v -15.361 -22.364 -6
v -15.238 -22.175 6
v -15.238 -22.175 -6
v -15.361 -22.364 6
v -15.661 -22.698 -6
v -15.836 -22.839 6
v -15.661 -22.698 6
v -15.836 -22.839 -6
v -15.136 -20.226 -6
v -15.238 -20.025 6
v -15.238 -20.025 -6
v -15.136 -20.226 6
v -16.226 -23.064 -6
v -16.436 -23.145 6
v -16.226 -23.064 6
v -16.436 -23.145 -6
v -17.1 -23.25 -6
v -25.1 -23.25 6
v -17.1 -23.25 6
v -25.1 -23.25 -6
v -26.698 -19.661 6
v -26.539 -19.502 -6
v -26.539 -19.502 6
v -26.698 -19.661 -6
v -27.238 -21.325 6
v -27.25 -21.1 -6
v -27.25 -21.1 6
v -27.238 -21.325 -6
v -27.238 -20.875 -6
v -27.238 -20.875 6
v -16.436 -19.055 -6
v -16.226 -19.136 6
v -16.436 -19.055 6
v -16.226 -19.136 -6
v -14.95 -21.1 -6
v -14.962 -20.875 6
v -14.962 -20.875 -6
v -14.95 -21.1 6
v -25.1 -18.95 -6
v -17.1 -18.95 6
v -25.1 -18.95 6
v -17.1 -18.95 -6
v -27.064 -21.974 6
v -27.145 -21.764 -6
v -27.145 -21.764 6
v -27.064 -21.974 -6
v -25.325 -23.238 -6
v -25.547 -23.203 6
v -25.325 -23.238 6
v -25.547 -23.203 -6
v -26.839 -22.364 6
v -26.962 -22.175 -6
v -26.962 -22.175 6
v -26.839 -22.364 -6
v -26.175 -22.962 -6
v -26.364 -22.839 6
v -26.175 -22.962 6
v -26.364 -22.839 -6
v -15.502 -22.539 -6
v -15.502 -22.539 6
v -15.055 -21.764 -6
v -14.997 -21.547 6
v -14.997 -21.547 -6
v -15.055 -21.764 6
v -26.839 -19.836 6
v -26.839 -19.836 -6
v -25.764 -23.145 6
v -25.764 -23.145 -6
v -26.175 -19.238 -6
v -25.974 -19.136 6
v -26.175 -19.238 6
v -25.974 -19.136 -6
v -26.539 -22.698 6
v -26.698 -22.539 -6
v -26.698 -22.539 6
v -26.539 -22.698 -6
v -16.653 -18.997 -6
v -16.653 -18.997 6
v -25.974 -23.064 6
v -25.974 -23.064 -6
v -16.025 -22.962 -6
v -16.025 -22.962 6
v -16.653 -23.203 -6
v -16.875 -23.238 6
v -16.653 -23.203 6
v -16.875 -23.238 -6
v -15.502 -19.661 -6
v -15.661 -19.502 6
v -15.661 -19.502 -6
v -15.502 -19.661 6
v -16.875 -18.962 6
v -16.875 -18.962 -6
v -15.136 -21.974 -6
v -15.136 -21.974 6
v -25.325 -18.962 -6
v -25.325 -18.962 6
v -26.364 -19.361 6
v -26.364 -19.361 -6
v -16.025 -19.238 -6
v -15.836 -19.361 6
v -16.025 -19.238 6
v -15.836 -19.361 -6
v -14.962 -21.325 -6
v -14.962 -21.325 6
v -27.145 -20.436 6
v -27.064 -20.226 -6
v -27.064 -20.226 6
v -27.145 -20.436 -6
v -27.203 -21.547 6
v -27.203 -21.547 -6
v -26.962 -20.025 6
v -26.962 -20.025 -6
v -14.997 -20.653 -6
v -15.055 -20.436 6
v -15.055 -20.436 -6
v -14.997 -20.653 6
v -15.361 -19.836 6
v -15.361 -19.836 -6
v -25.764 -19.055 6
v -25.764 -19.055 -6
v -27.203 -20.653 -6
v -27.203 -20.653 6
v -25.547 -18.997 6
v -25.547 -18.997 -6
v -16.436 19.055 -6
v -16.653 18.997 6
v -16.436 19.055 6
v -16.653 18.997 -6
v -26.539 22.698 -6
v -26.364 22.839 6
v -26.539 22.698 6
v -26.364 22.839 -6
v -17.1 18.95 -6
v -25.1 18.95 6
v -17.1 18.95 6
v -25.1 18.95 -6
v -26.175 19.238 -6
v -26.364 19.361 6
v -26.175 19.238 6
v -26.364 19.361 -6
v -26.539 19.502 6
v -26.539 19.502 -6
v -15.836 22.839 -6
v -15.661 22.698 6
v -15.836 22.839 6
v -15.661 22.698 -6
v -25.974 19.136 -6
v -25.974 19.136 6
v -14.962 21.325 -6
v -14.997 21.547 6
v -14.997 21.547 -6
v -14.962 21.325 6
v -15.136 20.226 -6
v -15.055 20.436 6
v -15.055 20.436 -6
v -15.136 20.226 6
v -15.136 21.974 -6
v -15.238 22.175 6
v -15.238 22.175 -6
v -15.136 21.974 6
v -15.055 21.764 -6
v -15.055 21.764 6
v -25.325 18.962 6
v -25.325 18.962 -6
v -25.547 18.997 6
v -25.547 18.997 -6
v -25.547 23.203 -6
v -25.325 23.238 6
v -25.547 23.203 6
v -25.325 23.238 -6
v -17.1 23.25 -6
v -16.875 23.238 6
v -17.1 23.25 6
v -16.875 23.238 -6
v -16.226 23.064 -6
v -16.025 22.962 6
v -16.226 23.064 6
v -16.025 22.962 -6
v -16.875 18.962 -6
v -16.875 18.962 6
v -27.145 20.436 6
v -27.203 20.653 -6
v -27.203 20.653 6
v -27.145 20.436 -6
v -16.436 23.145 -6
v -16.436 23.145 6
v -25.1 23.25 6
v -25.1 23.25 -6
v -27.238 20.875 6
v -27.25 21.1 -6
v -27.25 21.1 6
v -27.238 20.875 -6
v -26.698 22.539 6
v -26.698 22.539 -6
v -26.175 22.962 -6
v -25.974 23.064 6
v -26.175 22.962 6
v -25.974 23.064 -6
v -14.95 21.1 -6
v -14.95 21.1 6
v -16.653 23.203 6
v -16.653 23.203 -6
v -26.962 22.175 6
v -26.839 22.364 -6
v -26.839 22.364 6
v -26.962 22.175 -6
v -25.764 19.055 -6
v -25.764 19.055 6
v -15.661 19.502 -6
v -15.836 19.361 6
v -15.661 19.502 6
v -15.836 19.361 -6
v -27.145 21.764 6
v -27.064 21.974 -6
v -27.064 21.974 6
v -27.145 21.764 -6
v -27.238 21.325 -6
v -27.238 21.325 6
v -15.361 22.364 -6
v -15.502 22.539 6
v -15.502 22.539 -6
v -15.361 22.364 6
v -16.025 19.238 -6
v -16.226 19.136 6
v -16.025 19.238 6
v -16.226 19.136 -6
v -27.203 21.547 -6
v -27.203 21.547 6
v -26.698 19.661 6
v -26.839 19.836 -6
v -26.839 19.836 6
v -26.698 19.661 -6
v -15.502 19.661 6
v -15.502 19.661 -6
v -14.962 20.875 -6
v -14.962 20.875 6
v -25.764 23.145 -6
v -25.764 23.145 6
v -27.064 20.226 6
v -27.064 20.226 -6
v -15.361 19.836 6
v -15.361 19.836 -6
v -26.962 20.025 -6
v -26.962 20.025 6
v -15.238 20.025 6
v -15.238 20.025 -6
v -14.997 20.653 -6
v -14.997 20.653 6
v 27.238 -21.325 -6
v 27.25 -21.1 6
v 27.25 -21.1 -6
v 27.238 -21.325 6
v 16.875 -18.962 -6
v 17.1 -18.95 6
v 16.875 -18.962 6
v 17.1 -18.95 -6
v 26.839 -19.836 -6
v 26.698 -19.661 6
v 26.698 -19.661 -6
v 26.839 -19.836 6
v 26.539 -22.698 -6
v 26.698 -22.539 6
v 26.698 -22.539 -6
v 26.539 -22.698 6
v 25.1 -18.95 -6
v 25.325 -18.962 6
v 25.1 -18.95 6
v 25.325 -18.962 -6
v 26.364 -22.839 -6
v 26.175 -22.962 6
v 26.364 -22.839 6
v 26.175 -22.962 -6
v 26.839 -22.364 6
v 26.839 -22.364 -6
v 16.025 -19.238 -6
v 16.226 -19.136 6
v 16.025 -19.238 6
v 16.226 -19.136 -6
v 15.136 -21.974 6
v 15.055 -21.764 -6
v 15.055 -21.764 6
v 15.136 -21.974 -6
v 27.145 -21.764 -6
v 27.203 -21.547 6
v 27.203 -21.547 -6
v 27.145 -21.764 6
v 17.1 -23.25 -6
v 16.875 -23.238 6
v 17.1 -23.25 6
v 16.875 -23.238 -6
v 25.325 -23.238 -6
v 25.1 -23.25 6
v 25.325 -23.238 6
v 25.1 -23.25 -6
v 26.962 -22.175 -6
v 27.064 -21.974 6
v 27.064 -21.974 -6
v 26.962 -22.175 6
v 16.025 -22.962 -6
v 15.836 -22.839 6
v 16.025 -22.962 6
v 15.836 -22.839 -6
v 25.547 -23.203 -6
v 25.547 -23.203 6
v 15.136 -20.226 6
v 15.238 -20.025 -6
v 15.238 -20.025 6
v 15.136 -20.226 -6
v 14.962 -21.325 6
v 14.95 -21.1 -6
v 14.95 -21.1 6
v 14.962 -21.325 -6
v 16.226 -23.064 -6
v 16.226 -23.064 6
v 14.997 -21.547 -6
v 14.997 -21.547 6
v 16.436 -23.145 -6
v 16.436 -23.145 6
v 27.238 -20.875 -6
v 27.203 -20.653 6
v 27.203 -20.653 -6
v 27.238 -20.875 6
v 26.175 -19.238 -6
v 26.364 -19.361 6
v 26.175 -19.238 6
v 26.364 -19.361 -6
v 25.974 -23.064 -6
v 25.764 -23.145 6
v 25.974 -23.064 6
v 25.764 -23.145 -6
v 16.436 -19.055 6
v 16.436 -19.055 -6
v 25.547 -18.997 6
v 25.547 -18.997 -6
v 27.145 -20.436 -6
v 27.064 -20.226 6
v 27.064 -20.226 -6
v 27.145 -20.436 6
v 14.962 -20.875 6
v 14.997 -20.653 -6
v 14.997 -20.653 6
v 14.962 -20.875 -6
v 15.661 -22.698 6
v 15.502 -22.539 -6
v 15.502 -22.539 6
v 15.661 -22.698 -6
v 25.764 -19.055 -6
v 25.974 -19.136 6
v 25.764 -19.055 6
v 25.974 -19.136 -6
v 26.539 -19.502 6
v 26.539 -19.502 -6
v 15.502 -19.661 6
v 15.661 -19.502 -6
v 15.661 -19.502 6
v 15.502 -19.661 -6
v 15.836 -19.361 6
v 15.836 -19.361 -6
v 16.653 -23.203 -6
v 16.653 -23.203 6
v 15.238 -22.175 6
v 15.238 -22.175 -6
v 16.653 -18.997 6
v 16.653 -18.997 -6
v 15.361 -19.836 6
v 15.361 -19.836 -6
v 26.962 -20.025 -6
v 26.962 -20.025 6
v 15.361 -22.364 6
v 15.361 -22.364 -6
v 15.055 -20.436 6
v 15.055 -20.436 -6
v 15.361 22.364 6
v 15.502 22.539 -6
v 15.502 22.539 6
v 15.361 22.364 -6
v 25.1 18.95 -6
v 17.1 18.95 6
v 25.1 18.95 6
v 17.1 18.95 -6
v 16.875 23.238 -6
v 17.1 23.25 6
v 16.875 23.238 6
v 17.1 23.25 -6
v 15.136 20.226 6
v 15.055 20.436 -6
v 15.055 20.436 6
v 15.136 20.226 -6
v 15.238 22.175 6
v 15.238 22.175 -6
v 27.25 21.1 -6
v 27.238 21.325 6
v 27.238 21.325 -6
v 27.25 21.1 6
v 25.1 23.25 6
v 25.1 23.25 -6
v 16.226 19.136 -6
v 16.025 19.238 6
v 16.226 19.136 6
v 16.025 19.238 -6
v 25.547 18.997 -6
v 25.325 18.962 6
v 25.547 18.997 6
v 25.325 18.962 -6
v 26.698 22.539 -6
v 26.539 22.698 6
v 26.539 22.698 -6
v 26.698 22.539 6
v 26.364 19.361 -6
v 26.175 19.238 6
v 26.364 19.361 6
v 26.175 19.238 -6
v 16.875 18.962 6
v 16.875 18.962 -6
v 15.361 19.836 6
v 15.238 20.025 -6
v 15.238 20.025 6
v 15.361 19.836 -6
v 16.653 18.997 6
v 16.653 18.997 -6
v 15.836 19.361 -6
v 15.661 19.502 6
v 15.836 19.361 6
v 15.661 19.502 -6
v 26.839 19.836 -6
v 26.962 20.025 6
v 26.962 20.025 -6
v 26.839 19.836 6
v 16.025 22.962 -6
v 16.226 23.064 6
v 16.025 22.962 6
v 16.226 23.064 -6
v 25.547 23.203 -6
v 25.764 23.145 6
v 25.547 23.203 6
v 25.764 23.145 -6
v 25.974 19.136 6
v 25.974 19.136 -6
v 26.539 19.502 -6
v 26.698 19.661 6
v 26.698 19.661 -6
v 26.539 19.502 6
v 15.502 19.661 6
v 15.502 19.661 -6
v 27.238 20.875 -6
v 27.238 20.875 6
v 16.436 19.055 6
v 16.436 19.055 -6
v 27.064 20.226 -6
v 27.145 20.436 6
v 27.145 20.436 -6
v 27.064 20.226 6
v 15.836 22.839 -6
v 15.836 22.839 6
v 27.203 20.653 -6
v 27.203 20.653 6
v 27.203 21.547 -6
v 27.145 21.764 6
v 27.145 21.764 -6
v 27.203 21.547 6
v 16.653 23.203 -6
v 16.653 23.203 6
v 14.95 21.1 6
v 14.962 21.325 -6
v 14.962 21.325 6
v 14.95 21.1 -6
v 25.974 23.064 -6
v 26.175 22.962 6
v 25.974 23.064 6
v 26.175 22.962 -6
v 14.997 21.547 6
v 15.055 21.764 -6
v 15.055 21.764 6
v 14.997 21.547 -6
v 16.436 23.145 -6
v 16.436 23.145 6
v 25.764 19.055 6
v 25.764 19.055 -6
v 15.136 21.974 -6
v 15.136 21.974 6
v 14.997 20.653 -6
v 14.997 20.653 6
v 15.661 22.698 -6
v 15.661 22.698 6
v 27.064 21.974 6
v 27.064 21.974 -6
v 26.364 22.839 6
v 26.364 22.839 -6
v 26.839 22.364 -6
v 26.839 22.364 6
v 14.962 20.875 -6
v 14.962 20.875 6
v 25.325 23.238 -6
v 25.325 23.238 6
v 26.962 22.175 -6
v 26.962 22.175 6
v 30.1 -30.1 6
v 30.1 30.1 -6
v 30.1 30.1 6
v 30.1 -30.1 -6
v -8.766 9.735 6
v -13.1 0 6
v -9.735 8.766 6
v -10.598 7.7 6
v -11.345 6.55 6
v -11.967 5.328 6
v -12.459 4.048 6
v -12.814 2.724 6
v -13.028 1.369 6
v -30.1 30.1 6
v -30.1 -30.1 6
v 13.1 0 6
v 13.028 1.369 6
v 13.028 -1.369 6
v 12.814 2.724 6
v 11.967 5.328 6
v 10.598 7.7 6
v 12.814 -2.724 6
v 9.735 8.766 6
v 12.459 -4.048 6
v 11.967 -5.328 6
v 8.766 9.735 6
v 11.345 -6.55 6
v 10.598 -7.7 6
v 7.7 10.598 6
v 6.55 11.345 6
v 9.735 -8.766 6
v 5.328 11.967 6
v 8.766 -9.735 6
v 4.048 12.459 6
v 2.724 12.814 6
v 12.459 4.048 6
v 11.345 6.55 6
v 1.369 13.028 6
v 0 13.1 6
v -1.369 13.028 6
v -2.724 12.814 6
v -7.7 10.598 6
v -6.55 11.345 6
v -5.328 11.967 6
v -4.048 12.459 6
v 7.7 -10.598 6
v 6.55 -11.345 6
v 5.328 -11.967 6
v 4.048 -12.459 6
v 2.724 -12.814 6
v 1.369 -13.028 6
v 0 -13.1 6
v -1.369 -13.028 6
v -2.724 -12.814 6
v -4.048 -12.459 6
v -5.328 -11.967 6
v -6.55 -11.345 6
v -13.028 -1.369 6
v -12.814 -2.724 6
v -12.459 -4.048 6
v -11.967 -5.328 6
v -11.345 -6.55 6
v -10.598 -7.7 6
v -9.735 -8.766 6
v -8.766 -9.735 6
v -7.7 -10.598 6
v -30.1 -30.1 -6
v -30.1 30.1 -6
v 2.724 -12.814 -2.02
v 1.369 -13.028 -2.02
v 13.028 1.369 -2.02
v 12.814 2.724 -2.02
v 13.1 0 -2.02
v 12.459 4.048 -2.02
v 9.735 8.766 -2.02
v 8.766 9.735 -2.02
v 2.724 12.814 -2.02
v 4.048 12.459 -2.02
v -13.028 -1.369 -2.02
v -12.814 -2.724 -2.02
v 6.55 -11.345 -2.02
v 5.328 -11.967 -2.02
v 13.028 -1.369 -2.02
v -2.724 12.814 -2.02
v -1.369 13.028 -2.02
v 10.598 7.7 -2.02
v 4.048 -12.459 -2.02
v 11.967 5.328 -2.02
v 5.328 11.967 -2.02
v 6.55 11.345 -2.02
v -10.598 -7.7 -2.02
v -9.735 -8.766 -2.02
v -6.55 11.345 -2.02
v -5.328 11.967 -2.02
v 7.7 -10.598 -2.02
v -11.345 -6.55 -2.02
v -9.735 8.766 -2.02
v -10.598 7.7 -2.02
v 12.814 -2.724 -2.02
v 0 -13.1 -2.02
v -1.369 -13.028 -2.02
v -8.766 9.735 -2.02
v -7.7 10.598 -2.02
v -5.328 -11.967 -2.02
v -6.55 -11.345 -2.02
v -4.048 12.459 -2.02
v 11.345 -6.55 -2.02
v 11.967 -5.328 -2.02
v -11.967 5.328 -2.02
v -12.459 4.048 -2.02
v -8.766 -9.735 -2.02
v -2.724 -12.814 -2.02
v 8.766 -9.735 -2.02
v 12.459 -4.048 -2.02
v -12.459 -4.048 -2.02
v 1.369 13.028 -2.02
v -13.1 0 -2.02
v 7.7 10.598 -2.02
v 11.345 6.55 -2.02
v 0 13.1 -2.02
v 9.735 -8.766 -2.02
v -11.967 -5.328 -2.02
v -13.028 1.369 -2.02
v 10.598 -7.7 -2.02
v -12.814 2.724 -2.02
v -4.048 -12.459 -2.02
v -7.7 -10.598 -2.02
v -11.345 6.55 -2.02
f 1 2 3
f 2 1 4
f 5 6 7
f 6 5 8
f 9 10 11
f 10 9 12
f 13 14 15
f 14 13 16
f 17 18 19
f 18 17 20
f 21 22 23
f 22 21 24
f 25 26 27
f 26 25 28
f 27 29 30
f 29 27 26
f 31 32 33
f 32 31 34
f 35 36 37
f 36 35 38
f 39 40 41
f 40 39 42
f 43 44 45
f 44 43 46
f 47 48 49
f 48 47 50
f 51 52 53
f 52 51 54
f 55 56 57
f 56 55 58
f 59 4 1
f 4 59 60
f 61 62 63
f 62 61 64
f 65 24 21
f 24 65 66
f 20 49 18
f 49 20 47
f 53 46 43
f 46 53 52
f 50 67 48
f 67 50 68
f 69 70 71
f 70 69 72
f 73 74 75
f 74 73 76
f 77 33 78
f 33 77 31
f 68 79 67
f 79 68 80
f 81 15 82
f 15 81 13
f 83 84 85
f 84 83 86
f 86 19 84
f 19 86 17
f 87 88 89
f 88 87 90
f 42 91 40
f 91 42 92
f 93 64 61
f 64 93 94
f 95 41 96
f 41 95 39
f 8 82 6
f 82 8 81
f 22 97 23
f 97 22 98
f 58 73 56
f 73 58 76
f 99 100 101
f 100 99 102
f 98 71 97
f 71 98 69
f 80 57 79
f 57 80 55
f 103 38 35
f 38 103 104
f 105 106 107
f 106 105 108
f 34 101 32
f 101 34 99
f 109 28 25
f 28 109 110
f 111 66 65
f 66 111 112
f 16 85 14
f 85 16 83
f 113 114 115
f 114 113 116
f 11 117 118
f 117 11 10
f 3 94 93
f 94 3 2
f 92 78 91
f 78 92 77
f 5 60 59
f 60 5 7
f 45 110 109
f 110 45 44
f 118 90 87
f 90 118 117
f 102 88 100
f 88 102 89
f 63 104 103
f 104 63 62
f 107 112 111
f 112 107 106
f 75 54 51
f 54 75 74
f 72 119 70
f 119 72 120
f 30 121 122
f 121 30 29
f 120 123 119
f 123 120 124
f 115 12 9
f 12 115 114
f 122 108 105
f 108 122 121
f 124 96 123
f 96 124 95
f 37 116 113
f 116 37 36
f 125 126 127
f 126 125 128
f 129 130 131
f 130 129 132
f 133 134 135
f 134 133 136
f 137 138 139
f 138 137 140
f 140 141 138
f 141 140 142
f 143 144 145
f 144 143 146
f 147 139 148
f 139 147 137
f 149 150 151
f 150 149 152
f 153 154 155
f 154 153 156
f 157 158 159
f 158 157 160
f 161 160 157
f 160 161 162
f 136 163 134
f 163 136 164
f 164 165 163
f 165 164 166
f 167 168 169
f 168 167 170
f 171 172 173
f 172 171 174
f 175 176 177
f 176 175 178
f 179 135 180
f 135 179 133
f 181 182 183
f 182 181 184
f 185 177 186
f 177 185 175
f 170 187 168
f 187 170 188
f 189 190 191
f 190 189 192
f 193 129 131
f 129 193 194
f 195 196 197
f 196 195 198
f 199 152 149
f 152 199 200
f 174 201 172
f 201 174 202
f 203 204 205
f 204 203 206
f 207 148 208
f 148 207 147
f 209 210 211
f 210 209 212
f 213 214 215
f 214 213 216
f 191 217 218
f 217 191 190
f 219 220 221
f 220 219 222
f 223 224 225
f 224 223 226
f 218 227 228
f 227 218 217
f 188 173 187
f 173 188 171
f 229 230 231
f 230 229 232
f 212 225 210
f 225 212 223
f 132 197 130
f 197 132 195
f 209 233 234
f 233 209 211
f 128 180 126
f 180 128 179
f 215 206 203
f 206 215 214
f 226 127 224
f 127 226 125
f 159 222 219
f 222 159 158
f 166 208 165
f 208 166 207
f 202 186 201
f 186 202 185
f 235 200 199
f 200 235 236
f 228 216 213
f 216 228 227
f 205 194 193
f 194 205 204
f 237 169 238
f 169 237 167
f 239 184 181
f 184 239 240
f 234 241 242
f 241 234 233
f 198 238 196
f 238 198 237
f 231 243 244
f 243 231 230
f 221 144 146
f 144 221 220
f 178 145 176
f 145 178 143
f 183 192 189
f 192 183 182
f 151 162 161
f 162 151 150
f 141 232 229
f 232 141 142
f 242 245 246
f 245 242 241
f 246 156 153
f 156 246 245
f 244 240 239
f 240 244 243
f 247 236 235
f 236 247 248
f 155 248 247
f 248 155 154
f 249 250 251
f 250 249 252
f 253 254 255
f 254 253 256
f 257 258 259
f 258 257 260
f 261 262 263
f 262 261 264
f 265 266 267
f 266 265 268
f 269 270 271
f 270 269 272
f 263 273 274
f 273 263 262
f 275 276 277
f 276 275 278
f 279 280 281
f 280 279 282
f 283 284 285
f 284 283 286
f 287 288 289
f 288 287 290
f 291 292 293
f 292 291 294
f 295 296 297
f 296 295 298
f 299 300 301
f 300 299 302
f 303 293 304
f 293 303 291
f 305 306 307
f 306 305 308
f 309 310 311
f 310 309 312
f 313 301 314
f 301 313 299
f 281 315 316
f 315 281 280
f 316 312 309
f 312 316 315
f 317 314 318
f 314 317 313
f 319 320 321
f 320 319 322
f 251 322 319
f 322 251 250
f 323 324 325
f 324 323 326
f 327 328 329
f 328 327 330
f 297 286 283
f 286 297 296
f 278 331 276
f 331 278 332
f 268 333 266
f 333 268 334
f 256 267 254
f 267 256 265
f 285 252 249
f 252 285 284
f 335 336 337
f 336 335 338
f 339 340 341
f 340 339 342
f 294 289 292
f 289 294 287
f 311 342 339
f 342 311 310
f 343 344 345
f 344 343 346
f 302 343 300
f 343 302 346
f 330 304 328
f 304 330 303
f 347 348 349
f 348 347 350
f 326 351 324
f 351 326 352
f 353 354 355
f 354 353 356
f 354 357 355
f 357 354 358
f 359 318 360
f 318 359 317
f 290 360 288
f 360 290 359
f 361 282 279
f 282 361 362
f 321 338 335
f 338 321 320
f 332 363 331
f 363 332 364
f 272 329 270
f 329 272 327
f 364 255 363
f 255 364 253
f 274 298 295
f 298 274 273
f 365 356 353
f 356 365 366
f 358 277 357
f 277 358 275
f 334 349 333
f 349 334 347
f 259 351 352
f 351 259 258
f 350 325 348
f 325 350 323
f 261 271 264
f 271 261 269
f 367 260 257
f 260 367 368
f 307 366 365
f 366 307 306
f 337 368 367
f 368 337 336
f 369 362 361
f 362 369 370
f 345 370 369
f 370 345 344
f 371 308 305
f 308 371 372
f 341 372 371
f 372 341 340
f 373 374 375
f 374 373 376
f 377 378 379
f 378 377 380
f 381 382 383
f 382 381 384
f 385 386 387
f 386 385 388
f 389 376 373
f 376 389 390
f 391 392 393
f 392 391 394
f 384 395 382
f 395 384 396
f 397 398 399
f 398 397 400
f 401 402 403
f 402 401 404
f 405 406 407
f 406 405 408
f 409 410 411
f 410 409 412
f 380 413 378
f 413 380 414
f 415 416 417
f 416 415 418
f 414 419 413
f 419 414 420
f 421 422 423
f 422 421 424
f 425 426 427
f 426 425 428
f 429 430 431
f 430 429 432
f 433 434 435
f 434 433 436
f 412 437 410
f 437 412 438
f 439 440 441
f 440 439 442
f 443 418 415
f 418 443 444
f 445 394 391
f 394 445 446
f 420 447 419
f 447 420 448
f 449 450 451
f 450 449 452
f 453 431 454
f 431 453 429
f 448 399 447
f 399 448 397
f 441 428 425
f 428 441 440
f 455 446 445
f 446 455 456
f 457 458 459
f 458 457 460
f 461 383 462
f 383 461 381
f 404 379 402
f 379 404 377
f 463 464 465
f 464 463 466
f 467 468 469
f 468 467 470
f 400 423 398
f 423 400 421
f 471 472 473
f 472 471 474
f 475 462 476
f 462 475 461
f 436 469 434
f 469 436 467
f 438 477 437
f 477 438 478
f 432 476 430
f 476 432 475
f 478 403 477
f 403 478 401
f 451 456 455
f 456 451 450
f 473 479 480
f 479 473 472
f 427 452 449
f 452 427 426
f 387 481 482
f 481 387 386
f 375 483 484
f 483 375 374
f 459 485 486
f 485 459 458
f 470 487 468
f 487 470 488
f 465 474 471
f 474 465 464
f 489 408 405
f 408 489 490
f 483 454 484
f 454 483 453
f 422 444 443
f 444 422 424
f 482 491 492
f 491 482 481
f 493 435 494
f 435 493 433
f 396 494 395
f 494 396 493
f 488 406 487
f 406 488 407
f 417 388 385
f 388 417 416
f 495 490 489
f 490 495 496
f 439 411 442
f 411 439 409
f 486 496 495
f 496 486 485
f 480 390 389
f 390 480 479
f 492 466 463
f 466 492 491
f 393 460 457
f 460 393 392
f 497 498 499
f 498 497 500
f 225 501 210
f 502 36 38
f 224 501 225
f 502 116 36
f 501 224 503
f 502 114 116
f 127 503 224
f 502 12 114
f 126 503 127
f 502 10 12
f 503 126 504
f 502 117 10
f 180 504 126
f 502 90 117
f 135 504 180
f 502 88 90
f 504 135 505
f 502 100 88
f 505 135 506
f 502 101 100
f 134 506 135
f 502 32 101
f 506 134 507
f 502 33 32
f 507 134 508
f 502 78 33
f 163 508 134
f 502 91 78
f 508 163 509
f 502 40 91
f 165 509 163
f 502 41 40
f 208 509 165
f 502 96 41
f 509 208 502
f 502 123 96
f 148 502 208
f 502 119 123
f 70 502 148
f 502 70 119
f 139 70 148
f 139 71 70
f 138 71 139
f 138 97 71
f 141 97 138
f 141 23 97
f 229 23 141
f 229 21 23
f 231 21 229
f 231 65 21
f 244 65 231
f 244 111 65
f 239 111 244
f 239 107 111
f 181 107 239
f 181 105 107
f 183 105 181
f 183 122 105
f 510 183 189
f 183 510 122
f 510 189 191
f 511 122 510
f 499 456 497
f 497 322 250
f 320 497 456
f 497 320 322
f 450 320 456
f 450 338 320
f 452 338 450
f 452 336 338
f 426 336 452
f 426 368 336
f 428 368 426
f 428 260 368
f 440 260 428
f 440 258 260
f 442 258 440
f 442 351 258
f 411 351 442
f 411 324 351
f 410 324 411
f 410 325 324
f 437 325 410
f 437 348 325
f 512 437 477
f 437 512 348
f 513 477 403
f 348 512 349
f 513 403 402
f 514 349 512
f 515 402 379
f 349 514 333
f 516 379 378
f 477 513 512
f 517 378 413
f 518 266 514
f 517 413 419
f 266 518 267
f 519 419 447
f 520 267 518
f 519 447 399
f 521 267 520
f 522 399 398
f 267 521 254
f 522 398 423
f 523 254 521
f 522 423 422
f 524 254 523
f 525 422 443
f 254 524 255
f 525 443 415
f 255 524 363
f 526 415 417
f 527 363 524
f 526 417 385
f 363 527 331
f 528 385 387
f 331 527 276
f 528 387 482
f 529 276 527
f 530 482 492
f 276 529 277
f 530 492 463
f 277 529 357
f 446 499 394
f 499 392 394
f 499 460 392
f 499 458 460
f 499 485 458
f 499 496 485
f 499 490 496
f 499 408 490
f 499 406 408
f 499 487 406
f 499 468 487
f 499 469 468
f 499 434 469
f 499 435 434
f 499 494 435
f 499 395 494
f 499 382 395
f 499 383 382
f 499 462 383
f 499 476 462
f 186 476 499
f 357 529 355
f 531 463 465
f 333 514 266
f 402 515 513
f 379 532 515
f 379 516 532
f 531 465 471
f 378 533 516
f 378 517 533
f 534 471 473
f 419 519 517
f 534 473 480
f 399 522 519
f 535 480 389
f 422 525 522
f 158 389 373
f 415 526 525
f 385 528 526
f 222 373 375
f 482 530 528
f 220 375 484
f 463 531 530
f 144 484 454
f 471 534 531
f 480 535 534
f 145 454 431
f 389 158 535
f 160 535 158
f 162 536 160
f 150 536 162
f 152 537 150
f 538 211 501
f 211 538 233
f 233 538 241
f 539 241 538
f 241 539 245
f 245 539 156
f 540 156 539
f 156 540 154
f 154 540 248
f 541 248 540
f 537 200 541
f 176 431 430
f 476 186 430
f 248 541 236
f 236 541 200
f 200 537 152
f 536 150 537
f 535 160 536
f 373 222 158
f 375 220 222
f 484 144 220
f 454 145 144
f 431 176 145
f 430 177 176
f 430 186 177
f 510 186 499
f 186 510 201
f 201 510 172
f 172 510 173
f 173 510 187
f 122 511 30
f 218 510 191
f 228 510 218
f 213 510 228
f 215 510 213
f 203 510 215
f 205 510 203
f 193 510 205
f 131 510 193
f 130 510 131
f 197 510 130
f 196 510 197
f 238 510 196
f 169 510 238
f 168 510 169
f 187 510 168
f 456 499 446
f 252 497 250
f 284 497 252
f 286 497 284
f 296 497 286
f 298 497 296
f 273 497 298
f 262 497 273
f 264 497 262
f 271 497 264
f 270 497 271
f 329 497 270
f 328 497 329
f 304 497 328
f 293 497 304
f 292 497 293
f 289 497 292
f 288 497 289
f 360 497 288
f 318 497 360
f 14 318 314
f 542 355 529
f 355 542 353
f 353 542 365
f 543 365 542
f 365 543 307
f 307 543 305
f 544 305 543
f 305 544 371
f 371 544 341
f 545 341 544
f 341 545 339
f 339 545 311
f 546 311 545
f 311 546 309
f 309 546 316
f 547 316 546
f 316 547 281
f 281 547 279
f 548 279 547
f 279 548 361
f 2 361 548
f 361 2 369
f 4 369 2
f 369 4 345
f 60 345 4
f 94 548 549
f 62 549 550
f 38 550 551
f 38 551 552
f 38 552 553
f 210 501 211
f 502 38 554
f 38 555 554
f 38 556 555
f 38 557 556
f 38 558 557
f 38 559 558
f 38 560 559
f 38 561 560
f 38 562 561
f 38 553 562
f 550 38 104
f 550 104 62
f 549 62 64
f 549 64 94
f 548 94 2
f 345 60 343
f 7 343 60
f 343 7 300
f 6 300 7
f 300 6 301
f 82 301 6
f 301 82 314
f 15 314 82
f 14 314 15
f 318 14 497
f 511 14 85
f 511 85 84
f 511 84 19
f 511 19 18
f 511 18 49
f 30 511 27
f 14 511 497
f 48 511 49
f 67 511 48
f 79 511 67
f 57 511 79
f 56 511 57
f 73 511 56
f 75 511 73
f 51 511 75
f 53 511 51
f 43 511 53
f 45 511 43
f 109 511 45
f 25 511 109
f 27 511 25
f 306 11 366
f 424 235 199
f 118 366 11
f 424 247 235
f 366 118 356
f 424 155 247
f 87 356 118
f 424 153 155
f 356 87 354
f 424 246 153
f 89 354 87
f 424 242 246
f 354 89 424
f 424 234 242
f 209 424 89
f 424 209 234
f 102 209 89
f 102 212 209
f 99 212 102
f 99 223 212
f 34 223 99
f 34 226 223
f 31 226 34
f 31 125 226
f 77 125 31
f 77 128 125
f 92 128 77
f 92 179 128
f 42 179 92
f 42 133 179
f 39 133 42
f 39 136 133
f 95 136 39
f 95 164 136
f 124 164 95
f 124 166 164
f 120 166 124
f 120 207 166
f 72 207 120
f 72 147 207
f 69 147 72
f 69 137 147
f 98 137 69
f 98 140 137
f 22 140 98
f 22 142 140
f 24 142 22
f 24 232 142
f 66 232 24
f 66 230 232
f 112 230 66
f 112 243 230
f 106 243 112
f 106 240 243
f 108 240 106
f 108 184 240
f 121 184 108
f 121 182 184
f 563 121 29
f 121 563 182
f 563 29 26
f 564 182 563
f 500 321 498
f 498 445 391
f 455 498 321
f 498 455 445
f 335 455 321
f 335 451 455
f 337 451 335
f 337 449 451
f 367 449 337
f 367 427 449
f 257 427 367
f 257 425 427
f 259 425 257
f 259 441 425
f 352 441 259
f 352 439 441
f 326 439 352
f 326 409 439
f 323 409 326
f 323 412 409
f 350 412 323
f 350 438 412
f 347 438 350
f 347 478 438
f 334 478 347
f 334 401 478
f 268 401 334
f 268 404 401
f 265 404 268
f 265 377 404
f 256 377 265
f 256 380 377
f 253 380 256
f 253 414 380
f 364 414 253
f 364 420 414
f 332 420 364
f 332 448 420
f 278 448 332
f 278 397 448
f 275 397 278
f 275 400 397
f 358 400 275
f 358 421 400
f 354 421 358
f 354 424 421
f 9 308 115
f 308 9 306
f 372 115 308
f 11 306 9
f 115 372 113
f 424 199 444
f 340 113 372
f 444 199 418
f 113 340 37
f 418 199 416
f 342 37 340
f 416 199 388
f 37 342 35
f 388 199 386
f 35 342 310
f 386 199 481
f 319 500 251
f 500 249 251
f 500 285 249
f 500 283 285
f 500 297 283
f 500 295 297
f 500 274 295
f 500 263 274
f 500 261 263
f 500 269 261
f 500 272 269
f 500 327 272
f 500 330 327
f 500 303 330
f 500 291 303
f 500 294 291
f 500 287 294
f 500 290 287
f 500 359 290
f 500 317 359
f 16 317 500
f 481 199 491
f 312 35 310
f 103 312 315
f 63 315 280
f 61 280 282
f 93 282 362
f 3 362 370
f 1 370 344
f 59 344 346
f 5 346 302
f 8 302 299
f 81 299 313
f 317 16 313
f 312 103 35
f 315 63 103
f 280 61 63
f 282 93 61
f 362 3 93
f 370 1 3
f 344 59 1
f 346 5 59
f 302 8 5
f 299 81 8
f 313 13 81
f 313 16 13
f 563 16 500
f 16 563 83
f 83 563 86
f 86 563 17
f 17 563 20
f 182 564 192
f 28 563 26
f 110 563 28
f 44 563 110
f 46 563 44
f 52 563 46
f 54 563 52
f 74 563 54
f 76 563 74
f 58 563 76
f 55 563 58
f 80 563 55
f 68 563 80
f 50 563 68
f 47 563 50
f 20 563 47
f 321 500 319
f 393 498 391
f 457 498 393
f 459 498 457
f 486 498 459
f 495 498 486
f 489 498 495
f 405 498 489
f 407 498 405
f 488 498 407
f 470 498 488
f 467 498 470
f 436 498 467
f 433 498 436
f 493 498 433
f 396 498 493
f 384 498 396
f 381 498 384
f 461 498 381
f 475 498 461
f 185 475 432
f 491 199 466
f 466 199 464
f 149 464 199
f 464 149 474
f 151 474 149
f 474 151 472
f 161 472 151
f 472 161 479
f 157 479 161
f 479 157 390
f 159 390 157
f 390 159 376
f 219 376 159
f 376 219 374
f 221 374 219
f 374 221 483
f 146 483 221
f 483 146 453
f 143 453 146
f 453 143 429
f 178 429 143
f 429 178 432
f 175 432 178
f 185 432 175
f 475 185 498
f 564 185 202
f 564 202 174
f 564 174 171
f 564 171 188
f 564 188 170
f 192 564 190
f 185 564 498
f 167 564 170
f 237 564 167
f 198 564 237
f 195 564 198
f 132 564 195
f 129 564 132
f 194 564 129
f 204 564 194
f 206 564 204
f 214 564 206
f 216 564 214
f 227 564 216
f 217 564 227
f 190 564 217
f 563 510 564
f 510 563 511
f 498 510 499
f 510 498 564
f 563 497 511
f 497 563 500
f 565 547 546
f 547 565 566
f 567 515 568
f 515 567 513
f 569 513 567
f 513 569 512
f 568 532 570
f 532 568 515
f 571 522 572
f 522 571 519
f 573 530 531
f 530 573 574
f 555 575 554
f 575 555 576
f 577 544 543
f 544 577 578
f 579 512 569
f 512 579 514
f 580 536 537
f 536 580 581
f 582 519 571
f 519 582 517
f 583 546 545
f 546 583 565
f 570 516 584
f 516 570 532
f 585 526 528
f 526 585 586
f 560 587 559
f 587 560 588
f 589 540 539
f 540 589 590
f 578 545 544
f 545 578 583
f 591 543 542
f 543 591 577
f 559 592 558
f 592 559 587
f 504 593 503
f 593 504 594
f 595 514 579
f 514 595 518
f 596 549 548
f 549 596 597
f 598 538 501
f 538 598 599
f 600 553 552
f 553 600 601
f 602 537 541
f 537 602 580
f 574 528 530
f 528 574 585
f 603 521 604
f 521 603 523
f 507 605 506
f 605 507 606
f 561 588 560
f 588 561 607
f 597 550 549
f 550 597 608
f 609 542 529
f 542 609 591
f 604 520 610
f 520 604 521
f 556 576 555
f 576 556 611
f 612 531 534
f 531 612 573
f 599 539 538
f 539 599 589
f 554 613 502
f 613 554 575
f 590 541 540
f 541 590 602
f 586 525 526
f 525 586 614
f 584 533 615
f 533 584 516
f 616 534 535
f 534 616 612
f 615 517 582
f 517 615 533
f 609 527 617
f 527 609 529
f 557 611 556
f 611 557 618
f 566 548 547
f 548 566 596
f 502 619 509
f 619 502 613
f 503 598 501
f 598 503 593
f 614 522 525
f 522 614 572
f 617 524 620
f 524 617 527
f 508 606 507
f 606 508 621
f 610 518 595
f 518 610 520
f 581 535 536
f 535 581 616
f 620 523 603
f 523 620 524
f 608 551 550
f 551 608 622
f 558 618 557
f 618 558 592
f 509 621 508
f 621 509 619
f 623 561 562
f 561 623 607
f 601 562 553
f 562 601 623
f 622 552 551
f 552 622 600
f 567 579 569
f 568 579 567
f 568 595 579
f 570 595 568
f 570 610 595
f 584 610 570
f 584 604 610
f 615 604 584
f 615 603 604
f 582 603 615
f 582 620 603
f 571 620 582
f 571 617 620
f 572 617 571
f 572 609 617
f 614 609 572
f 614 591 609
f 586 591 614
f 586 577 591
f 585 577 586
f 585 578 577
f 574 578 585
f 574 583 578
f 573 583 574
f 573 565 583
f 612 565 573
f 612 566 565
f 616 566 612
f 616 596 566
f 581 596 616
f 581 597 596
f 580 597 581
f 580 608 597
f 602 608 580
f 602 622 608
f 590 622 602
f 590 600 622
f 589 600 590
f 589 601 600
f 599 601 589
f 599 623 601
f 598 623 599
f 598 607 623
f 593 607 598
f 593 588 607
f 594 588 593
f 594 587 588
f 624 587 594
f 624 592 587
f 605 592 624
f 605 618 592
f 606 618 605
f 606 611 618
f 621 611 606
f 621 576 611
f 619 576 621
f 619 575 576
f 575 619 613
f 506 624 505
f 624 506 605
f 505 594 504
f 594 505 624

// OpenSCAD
// Bearing mounting plate with 26.2 mm pocket.
$fn = 60;
eps = 0.02;
plate_w = 60.2;
plate_t = 12;
bearing_d = 26.2;
pocket_d = 8;
mount_pitch = 42.2;
module slot(x, y) {
    hull() {
        translate([x - 4, y, -plate_t / 2 - eps]) cylinder(d = 4.3, h = plate_t + 2 * eps);
        translate([x + 4, y, -plate_t / 2 - eps]) cylinder(d = 4.3, h = plate_t + 2 * eps);
    }
}
difference() {
    cube([plate_w, plate_w, plate_t], center = true);
    translate([0, 0, plate_t / 2 - pocket_d - eps]) cylinder(d = bearing_d, h = pocket_d + 2 * eps);
    for (x = [-mount_pitch / 2, mount_pitch / 2], y = [-mount_pitch / 2, mount_pitch / 2]) slot(x, y);
}
